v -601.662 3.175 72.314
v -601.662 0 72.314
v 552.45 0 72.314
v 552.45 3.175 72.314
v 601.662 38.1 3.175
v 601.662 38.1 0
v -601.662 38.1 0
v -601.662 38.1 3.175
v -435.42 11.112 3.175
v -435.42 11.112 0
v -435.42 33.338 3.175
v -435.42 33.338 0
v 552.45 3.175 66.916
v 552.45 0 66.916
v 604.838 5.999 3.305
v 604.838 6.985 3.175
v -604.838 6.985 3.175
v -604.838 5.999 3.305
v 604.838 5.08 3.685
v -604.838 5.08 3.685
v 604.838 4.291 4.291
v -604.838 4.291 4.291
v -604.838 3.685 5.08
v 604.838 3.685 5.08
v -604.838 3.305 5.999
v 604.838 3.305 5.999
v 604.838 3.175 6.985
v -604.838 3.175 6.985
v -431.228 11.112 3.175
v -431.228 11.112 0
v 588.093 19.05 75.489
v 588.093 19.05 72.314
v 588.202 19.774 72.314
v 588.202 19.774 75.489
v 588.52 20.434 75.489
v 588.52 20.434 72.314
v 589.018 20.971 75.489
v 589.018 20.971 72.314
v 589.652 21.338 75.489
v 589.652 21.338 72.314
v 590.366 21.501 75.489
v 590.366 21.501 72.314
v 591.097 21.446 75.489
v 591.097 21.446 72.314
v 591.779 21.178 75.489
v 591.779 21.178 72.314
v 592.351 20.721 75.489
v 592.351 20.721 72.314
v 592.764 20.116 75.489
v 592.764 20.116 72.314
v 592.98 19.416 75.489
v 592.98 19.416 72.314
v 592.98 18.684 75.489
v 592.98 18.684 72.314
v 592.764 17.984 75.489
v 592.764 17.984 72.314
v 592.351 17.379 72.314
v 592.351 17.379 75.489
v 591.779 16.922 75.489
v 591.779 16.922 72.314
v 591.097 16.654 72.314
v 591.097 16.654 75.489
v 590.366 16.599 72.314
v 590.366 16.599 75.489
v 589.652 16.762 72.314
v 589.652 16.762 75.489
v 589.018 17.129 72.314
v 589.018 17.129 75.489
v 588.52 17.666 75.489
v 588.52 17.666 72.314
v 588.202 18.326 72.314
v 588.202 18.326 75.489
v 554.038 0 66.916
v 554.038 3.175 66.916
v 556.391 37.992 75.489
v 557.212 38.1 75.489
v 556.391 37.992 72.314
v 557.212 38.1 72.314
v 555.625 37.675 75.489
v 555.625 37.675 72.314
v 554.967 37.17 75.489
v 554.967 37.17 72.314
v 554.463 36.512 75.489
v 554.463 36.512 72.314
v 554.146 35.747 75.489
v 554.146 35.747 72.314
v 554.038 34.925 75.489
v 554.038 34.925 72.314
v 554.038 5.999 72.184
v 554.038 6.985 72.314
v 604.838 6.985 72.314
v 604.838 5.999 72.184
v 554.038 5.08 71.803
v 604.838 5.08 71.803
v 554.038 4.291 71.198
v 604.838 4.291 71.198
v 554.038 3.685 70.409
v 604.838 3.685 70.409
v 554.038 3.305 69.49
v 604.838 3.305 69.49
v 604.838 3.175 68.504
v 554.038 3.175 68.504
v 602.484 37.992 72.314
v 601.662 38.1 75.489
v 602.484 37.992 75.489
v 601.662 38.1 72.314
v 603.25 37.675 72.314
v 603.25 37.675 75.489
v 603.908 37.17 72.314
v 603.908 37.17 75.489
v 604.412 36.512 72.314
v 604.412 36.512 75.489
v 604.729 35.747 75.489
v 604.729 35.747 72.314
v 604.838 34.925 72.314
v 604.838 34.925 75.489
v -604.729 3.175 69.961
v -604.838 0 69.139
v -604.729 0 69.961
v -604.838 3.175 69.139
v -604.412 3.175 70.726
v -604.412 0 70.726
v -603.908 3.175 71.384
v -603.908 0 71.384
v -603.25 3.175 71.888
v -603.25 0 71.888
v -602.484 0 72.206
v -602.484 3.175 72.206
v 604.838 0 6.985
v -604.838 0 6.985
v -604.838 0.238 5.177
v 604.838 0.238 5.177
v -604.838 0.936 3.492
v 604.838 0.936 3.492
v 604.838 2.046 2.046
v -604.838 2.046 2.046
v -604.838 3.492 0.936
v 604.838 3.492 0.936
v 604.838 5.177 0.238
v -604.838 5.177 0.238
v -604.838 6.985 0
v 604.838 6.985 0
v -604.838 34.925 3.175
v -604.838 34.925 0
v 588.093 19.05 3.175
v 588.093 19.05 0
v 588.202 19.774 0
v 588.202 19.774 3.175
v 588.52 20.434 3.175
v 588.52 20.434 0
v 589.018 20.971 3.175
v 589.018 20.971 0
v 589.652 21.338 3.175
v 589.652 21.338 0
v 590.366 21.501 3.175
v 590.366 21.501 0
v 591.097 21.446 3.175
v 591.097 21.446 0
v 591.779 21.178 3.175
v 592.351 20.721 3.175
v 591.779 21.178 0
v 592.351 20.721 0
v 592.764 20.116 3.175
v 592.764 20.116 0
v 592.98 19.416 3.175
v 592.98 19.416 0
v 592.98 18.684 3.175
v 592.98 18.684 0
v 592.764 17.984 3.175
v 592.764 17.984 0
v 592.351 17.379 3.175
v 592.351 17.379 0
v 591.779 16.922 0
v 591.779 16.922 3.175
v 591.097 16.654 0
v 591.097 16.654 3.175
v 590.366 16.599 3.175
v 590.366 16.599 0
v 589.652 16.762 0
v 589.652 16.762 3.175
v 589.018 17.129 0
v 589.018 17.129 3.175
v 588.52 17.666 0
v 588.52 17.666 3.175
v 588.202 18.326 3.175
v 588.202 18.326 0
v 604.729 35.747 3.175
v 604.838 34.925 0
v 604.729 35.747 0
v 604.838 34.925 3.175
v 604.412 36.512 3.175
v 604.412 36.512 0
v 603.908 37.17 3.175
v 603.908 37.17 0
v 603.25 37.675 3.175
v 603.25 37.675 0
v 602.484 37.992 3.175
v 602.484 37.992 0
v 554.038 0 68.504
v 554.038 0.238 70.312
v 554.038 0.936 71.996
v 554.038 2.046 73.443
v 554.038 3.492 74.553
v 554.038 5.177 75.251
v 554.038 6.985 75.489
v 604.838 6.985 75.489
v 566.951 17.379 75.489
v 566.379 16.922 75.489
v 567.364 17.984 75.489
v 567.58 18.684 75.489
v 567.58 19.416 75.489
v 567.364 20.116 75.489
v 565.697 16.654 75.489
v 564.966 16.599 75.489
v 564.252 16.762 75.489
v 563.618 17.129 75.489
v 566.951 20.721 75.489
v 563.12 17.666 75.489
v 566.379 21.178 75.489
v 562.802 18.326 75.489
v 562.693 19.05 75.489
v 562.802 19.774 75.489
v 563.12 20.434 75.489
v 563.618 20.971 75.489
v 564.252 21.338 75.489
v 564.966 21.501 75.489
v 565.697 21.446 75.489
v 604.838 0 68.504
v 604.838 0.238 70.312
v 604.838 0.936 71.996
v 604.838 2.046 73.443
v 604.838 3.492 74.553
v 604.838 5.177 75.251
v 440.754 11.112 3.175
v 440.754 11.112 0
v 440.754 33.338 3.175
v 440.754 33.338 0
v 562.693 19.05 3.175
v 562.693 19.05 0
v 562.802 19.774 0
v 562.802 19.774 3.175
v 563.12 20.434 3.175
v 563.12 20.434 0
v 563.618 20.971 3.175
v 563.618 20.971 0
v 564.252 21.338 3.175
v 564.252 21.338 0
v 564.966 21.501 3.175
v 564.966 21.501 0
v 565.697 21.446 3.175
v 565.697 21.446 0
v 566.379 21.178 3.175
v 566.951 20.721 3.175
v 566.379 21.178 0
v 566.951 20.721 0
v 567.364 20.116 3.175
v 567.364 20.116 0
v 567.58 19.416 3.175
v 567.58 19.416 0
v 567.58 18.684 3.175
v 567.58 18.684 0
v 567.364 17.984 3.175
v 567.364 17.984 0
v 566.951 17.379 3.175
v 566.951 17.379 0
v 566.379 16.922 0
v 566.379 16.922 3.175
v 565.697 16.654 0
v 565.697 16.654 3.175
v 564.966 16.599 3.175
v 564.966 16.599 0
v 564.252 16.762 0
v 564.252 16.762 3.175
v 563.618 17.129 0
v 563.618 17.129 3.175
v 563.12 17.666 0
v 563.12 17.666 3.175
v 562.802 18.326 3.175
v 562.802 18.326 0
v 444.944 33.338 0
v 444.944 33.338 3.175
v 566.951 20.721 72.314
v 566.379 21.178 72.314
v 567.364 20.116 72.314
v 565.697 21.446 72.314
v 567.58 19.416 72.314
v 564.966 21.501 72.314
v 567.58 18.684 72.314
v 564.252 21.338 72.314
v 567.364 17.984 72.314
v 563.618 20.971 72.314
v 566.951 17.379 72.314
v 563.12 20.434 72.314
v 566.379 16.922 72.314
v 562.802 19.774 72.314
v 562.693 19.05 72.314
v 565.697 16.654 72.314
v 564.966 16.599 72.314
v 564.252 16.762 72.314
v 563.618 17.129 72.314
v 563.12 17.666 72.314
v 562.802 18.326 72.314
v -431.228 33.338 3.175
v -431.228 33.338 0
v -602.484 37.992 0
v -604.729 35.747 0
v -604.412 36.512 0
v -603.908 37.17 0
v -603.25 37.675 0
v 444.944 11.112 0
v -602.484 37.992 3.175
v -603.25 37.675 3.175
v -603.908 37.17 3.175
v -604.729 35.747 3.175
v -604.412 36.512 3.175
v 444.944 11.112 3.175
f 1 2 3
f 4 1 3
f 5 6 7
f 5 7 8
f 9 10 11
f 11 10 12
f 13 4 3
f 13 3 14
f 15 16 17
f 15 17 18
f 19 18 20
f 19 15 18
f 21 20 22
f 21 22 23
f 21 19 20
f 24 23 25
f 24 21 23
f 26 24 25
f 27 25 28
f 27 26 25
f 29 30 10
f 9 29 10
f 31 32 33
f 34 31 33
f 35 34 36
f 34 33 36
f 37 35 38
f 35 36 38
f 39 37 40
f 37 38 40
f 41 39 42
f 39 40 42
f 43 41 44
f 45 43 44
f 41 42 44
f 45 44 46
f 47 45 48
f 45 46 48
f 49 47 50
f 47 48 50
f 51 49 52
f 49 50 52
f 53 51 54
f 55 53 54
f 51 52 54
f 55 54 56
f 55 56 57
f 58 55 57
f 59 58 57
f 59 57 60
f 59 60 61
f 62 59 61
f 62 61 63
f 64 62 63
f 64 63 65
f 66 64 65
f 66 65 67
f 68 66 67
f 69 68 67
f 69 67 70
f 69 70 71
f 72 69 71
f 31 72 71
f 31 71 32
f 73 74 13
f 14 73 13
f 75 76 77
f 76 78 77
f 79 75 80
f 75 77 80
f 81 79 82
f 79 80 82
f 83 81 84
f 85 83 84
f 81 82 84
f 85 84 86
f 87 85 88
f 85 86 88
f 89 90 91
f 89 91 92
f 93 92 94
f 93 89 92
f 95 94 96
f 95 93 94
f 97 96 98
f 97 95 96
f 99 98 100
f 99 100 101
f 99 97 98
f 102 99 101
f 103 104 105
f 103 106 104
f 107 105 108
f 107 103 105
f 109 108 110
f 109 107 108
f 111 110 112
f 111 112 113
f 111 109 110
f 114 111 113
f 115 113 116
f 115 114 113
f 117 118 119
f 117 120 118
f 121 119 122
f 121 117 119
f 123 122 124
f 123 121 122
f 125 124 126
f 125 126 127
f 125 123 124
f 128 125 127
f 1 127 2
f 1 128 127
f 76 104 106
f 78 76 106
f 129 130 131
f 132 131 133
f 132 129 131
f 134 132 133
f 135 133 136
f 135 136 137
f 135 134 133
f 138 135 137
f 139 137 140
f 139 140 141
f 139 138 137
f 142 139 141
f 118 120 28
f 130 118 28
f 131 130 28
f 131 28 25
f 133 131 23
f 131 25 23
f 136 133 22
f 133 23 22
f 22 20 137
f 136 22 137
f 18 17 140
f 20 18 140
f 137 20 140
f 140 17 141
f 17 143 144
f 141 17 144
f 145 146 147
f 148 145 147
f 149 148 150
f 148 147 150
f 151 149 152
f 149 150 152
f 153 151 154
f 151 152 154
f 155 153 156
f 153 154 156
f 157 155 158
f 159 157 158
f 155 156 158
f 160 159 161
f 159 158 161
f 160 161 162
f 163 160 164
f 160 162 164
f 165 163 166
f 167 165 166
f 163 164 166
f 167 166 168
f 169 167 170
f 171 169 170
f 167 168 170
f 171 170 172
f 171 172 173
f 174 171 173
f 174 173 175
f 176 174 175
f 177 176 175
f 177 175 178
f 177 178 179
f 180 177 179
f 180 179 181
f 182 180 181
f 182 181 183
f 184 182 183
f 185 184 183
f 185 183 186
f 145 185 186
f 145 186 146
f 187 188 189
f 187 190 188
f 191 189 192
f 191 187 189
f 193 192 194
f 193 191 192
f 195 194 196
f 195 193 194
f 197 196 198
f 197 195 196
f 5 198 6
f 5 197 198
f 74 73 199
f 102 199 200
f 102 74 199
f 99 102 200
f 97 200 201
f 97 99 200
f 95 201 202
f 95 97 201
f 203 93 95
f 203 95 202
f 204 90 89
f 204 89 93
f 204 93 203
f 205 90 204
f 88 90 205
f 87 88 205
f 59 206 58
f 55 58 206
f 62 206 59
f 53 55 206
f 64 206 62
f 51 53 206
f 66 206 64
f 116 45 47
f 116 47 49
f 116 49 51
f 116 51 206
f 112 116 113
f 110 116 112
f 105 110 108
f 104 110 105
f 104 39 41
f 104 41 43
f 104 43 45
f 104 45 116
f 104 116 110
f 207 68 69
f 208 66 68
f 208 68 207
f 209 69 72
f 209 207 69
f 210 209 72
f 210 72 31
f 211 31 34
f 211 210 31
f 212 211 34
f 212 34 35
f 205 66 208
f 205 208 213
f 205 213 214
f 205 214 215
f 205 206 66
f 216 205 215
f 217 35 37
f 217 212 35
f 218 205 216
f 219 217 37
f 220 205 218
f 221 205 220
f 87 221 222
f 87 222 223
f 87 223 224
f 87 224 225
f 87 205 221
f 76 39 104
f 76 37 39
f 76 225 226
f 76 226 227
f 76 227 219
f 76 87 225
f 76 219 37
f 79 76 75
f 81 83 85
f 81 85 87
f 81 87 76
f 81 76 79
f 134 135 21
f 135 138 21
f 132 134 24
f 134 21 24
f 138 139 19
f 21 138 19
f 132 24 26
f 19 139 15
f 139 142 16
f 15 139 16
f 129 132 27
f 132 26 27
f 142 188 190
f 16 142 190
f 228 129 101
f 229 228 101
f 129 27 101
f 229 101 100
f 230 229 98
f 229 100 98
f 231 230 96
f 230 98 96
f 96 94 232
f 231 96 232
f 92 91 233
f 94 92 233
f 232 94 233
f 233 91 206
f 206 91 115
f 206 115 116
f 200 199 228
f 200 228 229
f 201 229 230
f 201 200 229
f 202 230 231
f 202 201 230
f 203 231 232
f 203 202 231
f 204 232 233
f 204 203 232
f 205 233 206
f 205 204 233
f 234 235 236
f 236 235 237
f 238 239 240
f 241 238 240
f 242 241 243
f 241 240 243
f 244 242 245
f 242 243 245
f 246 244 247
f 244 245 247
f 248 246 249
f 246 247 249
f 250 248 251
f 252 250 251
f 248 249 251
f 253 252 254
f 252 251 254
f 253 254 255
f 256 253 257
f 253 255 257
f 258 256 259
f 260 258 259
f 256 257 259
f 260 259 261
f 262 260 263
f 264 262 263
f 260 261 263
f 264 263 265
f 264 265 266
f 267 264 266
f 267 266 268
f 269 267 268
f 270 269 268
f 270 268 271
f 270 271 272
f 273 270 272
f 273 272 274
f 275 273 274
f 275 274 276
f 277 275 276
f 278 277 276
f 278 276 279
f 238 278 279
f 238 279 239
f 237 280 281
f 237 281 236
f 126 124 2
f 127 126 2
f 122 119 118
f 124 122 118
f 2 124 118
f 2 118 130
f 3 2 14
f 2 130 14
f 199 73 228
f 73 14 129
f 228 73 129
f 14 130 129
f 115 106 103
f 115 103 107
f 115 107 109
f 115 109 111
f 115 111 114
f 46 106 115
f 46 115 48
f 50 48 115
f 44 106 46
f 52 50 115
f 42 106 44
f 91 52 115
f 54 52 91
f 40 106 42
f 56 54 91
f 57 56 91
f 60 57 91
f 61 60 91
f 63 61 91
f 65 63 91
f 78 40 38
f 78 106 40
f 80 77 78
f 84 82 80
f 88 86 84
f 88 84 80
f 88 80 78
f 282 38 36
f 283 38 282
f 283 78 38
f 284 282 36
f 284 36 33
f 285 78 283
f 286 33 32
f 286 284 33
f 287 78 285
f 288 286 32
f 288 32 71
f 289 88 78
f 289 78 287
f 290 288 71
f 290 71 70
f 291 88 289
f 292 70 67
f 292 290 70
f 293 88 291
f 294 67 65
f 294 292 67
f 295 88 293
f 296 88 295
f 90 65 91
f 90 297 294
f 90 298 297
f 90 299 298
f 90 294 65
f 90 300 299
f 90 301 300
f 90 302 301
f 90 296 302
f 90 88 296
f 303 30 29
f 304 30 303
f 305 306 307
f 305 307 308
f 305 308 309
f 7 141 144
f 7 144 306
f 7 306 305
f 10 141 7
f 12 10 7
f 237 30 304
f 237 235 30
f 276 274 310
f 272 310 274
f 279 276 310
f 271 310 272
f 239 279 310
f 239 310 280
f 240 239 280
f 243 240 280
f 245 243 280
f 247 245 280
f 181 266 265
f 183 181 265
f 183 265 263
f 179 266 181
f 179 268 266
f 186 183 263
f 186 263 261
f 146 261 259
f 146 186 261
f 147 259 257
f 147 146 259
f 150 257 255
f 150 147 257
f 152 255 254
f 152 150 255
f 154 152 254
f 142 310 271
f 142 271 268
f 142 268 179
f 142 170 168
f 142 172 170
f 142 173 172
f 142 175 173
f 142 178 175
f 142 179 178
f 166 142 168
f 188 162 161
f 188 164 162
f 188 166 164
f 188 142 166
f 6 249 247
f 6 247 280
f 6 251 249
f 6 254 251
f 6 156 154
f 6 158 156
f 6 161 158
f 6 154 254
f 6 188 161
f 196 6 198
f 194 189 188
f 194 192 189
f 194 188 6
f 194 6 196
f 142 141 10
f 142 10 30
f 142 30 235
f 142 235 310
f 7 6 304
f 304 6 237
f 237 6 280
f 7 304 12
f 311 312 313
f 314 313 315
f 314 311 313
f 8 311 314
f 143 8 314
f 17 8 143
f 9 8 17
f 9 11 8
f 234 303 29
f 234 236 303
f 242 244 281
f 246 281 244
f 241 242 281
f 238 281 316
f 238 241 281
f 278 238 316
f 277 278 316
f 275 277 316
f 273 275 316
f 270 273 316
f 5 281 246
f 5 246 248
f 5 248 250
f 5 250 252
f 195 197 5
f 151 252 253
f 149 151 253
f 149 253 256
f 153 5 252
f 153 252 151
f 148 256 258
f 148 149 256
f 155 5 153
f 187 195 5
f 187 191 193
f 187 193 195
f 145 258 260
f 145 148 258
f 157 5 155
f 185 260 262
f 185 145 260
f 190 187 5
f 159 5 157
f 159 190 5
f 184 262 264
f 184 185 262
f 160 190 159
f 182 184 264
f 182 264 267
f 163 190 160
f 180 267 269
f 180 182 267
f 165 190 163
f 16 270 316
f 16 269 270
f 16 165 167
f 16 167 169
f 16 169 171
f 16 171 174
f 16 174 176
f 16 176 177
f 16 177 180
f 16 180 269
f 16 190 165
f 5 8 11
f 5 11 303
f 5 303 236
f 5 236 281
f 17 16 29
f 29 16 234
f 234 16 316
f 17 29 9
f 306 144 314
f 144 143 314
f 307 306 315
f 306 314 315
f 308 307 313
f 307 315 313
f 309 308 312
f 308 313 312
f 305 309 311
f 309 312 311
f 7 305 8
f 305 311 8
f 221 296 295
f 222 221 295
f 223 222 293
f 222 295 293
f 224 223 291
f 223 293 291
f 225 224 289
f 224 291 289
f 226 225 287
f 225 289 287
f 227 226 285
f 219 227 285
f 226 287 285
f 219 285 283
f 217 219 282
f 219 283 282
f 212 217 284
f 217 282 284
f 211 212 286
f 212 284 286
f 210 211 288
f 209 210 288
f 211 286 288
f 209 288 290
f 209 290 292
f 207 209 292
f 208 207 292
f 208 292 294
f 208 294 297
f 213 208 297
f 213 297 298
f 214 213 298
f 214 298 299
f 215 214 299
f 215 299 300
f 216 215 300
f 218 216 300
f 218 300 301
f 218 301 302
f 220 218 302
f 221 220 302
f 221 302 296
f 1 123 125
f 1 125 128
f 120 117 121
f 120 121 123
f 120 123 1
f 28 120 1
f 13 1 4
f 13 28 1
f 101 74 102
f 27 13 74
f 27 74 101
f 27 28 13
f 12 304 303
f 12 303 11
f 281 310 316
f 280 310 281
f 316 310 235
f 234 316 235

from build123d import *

# Parameters (mm, degrees)
SKETCH1_W                     = 1209.675
SKETCH1_H                     = 72.3138
BASE_FLANGE1_DEPTH            = 3.175
EDGE_FLANGE1_STRIP_W          = 20.32
EDGE_FLANGE1_STRIP_H          = 3.175
EDGE_FLANGE1_STRIP_CUT_DEPTH  = 1209.675
EDGE_FLANGE1_DEPTH            = 1209.675
SKETCH10_W                    = 4.191
SKETCH10_H                    = 22.225
CUT_EXTRUDE2_DEPTH            = 611.335397201
FILLET1_R                     = 3.175
LPATTERN1_COUNT               = 2
LPATTERN1_PITCH               = 876.173
EDGE_FLANGE2_STRIP_W          = 20.32
EDGE_FLANGE2_STRIP_H          = 3.175
EDGE_FLANGE2_STRIP_CUT_DEPTH  = 50.8
EDGE_FLANGE2_RELIEF_W         = 21.9075
EDGE_FLANGE2_RELIEF_H         = 1.5875
EDGE_FLANGE2_RELIEF_CUT_DEPTH = 3.175
EDGE_FLANGE2_DEPTH            = 50.8
FILLET2_R                     = 3.175
F_10_0_1935_DIAMETER_HOLE1_D  = 4.9149


# Sheet-metal steps are written as plain solids
with BuildPart() as part:
    # Sketch1 → Base-Flange1 (new body)
    with BuildSketch(Plane(origin=(0, 0, 0), x_dir=(1, 0, 0), z_dir=(0, 1, 0))):
        with Locations((0, -36.1569)):
            Rectangle(SKETCH1_W, SKETCH1_H)
    extrude(amount=BASE_FLANGE1_DEPTH)

    # Edge-Flange1 strip (across the edge) → Edge-Flange1 strip cut (cut)
    with BuildSketch(Plane(origin=(604.8375, 3.175, 0), x_dir=(0, 0, 1), z_dir=(-1, 0, 0))):
        with Locations((-3.175, -1.5875)):
            Rectangle(EDGE_FLANGE1_STRIP_W, EDGE_FLANGE1_STRIP_H)
    extrude(amount=EDGE_FLANGE1_STRIP_CUT_DEPTH, mode=Mode.SUBTRACT)

    # Edge-Flange1 section (across the edge) → Edge-Flange1 (add)
    with BuildSketch(Plane(origin=(604.8375, 3.175, 0), x_dir=(0, 0, 1), z_dir=(-1, 0, 0))):
        with BuildLine():
            Line((0, 3.81), (0, 34.925))
            Line((0, 34.925), (3.175, 34.925))
            Line((3.175, 34.925), (3.175, 3.81))
            ThreePointArc((3.175, 3.81), (4.290923164, 1.115923164), (6.985, 0))
            Line((6.985, 0), (6.985, -3.175))
            ThreePointArc((6.985, -3.175), (2.045859133, -1.129140867), (0, 3.81))
        make_face()
    extrude(amount=EDGE_FLANGE1_DEPTH)

    # Sketch10 → Cut-Extrude2 (cut, through all)
    with BuildSketch(Plane(origin=(0, 0, 0), x_dir=(-1, 0, 0), z_dir=(0, 0, -1))):
        with Locations((433.324, 22.225)):
            Rectangle(SKETCH10_W, SKETCH10_H)
    cut_extrude2 = extrude(amount=-CUT_EXTRUDE2_DEPTH, mode=Mode.SUBTRACT)

    # Fillet1
    fillet1_edges = [part.edges().sort_by_distance(p)[0] for p in [
        (604.8375, 38.1, 1.5875),
        (-604.8375, 38.1, 1.5875),
        (-604.8375, 1.5875, 72.3138),
    ]]
    fillet(fillet1_edges, radius=FILLET1_R)

    # LPattern1: Cut-Extrude2 ×2
    with Locations(*[(i * LPATTERN1_PITCH, 0, 0) for i in range(1, LPATTERN1_COUNT)]):
        add(cut_extrude2, mode=Mode.SUBTRACT)

    # Edge-Flange2 strip (across the edge) → Edge-Flange2 strip cut (cut)
    with BuildSketch(Plane(origin=(554.0375, 3.175, 72.3138), x_dir=(0, 0, -1), z_dir=(1, 0, 0))):
        with Locations((-6.35, -1.5875)):
            Rectangle(EDGE_FLANGE2_STRIP_W, EDGE_FLANGE2_STRIP_H)
    extrude(amount=EDGE_FLANGE2_STRIP_CUT_DEPTH, mode=Mode.SUBTRACT)

    # Edge-Flange2 relief (on the sheet) → Edge-Flange2 relief cut (cut)
    with BuildSketch(Plane(origin=(554.0375, 3.175, 68.5038), x_dir=(0, 0, -1), z_dir=(0, 1, 0))):
        with Locations((-9.36625, 0.79375)):
            Rectangle(EDGE_FLANGE2_RELIEF_W, EDGE_FLANGE2_RELIEF_H)
    extrude(amount=-EDGE_FLANGE2_RELIEF_CUT_DEPTH, mode=Mode.SUBTRACT)

    # Edge-Flange2 section (across the edge) → Edge-Flange2 (add)
    with BuildSketch(Plane(origin=(554.0375, 3.175, 72.3138), x_dir=(0, 0, -1), z_dir=(1, 0, 0))):
        with BuildLine():
            Line((-3.175, 3.81), (-3.175, 34.925))
            Line((-3.175, 34.925), (0, 34.925))
            Line((0, 34.925), (0, 3.81))
            ThreePointArc((0, 3.81), (1.115923164, 1.115923164), (3.81, 0))
            Line((3.81, 0), (3.81, -3.175))
            ThreePointArc((3.81, -3.175), (-1.129140867, -1.129140867), (-3.175, 3.81))
        make_face()
    extrude(amount=EDGE_FLANGE2_DEPTH)

    # Fillet2
    fillet2_edges = [part.edges().sort_by_distance(p)[0] for p in [
        (554.0375, 38.1, 73.9013),
        (604.8375, 38.1, 73.9013),
    ]]
    fillet(fillet2_edges, radius=FILLET2_R)

    # #10 (0.1935) Diameter Hole1 (through all)
    with Locations(Plane.XY.offset(75.4888)):
        with Locations((590.55, 19.05), (565.15, 19.05)):
            Hole(F_10_0_1935_DIAMETER_HOLE1_D / 2)


solid = part.part
